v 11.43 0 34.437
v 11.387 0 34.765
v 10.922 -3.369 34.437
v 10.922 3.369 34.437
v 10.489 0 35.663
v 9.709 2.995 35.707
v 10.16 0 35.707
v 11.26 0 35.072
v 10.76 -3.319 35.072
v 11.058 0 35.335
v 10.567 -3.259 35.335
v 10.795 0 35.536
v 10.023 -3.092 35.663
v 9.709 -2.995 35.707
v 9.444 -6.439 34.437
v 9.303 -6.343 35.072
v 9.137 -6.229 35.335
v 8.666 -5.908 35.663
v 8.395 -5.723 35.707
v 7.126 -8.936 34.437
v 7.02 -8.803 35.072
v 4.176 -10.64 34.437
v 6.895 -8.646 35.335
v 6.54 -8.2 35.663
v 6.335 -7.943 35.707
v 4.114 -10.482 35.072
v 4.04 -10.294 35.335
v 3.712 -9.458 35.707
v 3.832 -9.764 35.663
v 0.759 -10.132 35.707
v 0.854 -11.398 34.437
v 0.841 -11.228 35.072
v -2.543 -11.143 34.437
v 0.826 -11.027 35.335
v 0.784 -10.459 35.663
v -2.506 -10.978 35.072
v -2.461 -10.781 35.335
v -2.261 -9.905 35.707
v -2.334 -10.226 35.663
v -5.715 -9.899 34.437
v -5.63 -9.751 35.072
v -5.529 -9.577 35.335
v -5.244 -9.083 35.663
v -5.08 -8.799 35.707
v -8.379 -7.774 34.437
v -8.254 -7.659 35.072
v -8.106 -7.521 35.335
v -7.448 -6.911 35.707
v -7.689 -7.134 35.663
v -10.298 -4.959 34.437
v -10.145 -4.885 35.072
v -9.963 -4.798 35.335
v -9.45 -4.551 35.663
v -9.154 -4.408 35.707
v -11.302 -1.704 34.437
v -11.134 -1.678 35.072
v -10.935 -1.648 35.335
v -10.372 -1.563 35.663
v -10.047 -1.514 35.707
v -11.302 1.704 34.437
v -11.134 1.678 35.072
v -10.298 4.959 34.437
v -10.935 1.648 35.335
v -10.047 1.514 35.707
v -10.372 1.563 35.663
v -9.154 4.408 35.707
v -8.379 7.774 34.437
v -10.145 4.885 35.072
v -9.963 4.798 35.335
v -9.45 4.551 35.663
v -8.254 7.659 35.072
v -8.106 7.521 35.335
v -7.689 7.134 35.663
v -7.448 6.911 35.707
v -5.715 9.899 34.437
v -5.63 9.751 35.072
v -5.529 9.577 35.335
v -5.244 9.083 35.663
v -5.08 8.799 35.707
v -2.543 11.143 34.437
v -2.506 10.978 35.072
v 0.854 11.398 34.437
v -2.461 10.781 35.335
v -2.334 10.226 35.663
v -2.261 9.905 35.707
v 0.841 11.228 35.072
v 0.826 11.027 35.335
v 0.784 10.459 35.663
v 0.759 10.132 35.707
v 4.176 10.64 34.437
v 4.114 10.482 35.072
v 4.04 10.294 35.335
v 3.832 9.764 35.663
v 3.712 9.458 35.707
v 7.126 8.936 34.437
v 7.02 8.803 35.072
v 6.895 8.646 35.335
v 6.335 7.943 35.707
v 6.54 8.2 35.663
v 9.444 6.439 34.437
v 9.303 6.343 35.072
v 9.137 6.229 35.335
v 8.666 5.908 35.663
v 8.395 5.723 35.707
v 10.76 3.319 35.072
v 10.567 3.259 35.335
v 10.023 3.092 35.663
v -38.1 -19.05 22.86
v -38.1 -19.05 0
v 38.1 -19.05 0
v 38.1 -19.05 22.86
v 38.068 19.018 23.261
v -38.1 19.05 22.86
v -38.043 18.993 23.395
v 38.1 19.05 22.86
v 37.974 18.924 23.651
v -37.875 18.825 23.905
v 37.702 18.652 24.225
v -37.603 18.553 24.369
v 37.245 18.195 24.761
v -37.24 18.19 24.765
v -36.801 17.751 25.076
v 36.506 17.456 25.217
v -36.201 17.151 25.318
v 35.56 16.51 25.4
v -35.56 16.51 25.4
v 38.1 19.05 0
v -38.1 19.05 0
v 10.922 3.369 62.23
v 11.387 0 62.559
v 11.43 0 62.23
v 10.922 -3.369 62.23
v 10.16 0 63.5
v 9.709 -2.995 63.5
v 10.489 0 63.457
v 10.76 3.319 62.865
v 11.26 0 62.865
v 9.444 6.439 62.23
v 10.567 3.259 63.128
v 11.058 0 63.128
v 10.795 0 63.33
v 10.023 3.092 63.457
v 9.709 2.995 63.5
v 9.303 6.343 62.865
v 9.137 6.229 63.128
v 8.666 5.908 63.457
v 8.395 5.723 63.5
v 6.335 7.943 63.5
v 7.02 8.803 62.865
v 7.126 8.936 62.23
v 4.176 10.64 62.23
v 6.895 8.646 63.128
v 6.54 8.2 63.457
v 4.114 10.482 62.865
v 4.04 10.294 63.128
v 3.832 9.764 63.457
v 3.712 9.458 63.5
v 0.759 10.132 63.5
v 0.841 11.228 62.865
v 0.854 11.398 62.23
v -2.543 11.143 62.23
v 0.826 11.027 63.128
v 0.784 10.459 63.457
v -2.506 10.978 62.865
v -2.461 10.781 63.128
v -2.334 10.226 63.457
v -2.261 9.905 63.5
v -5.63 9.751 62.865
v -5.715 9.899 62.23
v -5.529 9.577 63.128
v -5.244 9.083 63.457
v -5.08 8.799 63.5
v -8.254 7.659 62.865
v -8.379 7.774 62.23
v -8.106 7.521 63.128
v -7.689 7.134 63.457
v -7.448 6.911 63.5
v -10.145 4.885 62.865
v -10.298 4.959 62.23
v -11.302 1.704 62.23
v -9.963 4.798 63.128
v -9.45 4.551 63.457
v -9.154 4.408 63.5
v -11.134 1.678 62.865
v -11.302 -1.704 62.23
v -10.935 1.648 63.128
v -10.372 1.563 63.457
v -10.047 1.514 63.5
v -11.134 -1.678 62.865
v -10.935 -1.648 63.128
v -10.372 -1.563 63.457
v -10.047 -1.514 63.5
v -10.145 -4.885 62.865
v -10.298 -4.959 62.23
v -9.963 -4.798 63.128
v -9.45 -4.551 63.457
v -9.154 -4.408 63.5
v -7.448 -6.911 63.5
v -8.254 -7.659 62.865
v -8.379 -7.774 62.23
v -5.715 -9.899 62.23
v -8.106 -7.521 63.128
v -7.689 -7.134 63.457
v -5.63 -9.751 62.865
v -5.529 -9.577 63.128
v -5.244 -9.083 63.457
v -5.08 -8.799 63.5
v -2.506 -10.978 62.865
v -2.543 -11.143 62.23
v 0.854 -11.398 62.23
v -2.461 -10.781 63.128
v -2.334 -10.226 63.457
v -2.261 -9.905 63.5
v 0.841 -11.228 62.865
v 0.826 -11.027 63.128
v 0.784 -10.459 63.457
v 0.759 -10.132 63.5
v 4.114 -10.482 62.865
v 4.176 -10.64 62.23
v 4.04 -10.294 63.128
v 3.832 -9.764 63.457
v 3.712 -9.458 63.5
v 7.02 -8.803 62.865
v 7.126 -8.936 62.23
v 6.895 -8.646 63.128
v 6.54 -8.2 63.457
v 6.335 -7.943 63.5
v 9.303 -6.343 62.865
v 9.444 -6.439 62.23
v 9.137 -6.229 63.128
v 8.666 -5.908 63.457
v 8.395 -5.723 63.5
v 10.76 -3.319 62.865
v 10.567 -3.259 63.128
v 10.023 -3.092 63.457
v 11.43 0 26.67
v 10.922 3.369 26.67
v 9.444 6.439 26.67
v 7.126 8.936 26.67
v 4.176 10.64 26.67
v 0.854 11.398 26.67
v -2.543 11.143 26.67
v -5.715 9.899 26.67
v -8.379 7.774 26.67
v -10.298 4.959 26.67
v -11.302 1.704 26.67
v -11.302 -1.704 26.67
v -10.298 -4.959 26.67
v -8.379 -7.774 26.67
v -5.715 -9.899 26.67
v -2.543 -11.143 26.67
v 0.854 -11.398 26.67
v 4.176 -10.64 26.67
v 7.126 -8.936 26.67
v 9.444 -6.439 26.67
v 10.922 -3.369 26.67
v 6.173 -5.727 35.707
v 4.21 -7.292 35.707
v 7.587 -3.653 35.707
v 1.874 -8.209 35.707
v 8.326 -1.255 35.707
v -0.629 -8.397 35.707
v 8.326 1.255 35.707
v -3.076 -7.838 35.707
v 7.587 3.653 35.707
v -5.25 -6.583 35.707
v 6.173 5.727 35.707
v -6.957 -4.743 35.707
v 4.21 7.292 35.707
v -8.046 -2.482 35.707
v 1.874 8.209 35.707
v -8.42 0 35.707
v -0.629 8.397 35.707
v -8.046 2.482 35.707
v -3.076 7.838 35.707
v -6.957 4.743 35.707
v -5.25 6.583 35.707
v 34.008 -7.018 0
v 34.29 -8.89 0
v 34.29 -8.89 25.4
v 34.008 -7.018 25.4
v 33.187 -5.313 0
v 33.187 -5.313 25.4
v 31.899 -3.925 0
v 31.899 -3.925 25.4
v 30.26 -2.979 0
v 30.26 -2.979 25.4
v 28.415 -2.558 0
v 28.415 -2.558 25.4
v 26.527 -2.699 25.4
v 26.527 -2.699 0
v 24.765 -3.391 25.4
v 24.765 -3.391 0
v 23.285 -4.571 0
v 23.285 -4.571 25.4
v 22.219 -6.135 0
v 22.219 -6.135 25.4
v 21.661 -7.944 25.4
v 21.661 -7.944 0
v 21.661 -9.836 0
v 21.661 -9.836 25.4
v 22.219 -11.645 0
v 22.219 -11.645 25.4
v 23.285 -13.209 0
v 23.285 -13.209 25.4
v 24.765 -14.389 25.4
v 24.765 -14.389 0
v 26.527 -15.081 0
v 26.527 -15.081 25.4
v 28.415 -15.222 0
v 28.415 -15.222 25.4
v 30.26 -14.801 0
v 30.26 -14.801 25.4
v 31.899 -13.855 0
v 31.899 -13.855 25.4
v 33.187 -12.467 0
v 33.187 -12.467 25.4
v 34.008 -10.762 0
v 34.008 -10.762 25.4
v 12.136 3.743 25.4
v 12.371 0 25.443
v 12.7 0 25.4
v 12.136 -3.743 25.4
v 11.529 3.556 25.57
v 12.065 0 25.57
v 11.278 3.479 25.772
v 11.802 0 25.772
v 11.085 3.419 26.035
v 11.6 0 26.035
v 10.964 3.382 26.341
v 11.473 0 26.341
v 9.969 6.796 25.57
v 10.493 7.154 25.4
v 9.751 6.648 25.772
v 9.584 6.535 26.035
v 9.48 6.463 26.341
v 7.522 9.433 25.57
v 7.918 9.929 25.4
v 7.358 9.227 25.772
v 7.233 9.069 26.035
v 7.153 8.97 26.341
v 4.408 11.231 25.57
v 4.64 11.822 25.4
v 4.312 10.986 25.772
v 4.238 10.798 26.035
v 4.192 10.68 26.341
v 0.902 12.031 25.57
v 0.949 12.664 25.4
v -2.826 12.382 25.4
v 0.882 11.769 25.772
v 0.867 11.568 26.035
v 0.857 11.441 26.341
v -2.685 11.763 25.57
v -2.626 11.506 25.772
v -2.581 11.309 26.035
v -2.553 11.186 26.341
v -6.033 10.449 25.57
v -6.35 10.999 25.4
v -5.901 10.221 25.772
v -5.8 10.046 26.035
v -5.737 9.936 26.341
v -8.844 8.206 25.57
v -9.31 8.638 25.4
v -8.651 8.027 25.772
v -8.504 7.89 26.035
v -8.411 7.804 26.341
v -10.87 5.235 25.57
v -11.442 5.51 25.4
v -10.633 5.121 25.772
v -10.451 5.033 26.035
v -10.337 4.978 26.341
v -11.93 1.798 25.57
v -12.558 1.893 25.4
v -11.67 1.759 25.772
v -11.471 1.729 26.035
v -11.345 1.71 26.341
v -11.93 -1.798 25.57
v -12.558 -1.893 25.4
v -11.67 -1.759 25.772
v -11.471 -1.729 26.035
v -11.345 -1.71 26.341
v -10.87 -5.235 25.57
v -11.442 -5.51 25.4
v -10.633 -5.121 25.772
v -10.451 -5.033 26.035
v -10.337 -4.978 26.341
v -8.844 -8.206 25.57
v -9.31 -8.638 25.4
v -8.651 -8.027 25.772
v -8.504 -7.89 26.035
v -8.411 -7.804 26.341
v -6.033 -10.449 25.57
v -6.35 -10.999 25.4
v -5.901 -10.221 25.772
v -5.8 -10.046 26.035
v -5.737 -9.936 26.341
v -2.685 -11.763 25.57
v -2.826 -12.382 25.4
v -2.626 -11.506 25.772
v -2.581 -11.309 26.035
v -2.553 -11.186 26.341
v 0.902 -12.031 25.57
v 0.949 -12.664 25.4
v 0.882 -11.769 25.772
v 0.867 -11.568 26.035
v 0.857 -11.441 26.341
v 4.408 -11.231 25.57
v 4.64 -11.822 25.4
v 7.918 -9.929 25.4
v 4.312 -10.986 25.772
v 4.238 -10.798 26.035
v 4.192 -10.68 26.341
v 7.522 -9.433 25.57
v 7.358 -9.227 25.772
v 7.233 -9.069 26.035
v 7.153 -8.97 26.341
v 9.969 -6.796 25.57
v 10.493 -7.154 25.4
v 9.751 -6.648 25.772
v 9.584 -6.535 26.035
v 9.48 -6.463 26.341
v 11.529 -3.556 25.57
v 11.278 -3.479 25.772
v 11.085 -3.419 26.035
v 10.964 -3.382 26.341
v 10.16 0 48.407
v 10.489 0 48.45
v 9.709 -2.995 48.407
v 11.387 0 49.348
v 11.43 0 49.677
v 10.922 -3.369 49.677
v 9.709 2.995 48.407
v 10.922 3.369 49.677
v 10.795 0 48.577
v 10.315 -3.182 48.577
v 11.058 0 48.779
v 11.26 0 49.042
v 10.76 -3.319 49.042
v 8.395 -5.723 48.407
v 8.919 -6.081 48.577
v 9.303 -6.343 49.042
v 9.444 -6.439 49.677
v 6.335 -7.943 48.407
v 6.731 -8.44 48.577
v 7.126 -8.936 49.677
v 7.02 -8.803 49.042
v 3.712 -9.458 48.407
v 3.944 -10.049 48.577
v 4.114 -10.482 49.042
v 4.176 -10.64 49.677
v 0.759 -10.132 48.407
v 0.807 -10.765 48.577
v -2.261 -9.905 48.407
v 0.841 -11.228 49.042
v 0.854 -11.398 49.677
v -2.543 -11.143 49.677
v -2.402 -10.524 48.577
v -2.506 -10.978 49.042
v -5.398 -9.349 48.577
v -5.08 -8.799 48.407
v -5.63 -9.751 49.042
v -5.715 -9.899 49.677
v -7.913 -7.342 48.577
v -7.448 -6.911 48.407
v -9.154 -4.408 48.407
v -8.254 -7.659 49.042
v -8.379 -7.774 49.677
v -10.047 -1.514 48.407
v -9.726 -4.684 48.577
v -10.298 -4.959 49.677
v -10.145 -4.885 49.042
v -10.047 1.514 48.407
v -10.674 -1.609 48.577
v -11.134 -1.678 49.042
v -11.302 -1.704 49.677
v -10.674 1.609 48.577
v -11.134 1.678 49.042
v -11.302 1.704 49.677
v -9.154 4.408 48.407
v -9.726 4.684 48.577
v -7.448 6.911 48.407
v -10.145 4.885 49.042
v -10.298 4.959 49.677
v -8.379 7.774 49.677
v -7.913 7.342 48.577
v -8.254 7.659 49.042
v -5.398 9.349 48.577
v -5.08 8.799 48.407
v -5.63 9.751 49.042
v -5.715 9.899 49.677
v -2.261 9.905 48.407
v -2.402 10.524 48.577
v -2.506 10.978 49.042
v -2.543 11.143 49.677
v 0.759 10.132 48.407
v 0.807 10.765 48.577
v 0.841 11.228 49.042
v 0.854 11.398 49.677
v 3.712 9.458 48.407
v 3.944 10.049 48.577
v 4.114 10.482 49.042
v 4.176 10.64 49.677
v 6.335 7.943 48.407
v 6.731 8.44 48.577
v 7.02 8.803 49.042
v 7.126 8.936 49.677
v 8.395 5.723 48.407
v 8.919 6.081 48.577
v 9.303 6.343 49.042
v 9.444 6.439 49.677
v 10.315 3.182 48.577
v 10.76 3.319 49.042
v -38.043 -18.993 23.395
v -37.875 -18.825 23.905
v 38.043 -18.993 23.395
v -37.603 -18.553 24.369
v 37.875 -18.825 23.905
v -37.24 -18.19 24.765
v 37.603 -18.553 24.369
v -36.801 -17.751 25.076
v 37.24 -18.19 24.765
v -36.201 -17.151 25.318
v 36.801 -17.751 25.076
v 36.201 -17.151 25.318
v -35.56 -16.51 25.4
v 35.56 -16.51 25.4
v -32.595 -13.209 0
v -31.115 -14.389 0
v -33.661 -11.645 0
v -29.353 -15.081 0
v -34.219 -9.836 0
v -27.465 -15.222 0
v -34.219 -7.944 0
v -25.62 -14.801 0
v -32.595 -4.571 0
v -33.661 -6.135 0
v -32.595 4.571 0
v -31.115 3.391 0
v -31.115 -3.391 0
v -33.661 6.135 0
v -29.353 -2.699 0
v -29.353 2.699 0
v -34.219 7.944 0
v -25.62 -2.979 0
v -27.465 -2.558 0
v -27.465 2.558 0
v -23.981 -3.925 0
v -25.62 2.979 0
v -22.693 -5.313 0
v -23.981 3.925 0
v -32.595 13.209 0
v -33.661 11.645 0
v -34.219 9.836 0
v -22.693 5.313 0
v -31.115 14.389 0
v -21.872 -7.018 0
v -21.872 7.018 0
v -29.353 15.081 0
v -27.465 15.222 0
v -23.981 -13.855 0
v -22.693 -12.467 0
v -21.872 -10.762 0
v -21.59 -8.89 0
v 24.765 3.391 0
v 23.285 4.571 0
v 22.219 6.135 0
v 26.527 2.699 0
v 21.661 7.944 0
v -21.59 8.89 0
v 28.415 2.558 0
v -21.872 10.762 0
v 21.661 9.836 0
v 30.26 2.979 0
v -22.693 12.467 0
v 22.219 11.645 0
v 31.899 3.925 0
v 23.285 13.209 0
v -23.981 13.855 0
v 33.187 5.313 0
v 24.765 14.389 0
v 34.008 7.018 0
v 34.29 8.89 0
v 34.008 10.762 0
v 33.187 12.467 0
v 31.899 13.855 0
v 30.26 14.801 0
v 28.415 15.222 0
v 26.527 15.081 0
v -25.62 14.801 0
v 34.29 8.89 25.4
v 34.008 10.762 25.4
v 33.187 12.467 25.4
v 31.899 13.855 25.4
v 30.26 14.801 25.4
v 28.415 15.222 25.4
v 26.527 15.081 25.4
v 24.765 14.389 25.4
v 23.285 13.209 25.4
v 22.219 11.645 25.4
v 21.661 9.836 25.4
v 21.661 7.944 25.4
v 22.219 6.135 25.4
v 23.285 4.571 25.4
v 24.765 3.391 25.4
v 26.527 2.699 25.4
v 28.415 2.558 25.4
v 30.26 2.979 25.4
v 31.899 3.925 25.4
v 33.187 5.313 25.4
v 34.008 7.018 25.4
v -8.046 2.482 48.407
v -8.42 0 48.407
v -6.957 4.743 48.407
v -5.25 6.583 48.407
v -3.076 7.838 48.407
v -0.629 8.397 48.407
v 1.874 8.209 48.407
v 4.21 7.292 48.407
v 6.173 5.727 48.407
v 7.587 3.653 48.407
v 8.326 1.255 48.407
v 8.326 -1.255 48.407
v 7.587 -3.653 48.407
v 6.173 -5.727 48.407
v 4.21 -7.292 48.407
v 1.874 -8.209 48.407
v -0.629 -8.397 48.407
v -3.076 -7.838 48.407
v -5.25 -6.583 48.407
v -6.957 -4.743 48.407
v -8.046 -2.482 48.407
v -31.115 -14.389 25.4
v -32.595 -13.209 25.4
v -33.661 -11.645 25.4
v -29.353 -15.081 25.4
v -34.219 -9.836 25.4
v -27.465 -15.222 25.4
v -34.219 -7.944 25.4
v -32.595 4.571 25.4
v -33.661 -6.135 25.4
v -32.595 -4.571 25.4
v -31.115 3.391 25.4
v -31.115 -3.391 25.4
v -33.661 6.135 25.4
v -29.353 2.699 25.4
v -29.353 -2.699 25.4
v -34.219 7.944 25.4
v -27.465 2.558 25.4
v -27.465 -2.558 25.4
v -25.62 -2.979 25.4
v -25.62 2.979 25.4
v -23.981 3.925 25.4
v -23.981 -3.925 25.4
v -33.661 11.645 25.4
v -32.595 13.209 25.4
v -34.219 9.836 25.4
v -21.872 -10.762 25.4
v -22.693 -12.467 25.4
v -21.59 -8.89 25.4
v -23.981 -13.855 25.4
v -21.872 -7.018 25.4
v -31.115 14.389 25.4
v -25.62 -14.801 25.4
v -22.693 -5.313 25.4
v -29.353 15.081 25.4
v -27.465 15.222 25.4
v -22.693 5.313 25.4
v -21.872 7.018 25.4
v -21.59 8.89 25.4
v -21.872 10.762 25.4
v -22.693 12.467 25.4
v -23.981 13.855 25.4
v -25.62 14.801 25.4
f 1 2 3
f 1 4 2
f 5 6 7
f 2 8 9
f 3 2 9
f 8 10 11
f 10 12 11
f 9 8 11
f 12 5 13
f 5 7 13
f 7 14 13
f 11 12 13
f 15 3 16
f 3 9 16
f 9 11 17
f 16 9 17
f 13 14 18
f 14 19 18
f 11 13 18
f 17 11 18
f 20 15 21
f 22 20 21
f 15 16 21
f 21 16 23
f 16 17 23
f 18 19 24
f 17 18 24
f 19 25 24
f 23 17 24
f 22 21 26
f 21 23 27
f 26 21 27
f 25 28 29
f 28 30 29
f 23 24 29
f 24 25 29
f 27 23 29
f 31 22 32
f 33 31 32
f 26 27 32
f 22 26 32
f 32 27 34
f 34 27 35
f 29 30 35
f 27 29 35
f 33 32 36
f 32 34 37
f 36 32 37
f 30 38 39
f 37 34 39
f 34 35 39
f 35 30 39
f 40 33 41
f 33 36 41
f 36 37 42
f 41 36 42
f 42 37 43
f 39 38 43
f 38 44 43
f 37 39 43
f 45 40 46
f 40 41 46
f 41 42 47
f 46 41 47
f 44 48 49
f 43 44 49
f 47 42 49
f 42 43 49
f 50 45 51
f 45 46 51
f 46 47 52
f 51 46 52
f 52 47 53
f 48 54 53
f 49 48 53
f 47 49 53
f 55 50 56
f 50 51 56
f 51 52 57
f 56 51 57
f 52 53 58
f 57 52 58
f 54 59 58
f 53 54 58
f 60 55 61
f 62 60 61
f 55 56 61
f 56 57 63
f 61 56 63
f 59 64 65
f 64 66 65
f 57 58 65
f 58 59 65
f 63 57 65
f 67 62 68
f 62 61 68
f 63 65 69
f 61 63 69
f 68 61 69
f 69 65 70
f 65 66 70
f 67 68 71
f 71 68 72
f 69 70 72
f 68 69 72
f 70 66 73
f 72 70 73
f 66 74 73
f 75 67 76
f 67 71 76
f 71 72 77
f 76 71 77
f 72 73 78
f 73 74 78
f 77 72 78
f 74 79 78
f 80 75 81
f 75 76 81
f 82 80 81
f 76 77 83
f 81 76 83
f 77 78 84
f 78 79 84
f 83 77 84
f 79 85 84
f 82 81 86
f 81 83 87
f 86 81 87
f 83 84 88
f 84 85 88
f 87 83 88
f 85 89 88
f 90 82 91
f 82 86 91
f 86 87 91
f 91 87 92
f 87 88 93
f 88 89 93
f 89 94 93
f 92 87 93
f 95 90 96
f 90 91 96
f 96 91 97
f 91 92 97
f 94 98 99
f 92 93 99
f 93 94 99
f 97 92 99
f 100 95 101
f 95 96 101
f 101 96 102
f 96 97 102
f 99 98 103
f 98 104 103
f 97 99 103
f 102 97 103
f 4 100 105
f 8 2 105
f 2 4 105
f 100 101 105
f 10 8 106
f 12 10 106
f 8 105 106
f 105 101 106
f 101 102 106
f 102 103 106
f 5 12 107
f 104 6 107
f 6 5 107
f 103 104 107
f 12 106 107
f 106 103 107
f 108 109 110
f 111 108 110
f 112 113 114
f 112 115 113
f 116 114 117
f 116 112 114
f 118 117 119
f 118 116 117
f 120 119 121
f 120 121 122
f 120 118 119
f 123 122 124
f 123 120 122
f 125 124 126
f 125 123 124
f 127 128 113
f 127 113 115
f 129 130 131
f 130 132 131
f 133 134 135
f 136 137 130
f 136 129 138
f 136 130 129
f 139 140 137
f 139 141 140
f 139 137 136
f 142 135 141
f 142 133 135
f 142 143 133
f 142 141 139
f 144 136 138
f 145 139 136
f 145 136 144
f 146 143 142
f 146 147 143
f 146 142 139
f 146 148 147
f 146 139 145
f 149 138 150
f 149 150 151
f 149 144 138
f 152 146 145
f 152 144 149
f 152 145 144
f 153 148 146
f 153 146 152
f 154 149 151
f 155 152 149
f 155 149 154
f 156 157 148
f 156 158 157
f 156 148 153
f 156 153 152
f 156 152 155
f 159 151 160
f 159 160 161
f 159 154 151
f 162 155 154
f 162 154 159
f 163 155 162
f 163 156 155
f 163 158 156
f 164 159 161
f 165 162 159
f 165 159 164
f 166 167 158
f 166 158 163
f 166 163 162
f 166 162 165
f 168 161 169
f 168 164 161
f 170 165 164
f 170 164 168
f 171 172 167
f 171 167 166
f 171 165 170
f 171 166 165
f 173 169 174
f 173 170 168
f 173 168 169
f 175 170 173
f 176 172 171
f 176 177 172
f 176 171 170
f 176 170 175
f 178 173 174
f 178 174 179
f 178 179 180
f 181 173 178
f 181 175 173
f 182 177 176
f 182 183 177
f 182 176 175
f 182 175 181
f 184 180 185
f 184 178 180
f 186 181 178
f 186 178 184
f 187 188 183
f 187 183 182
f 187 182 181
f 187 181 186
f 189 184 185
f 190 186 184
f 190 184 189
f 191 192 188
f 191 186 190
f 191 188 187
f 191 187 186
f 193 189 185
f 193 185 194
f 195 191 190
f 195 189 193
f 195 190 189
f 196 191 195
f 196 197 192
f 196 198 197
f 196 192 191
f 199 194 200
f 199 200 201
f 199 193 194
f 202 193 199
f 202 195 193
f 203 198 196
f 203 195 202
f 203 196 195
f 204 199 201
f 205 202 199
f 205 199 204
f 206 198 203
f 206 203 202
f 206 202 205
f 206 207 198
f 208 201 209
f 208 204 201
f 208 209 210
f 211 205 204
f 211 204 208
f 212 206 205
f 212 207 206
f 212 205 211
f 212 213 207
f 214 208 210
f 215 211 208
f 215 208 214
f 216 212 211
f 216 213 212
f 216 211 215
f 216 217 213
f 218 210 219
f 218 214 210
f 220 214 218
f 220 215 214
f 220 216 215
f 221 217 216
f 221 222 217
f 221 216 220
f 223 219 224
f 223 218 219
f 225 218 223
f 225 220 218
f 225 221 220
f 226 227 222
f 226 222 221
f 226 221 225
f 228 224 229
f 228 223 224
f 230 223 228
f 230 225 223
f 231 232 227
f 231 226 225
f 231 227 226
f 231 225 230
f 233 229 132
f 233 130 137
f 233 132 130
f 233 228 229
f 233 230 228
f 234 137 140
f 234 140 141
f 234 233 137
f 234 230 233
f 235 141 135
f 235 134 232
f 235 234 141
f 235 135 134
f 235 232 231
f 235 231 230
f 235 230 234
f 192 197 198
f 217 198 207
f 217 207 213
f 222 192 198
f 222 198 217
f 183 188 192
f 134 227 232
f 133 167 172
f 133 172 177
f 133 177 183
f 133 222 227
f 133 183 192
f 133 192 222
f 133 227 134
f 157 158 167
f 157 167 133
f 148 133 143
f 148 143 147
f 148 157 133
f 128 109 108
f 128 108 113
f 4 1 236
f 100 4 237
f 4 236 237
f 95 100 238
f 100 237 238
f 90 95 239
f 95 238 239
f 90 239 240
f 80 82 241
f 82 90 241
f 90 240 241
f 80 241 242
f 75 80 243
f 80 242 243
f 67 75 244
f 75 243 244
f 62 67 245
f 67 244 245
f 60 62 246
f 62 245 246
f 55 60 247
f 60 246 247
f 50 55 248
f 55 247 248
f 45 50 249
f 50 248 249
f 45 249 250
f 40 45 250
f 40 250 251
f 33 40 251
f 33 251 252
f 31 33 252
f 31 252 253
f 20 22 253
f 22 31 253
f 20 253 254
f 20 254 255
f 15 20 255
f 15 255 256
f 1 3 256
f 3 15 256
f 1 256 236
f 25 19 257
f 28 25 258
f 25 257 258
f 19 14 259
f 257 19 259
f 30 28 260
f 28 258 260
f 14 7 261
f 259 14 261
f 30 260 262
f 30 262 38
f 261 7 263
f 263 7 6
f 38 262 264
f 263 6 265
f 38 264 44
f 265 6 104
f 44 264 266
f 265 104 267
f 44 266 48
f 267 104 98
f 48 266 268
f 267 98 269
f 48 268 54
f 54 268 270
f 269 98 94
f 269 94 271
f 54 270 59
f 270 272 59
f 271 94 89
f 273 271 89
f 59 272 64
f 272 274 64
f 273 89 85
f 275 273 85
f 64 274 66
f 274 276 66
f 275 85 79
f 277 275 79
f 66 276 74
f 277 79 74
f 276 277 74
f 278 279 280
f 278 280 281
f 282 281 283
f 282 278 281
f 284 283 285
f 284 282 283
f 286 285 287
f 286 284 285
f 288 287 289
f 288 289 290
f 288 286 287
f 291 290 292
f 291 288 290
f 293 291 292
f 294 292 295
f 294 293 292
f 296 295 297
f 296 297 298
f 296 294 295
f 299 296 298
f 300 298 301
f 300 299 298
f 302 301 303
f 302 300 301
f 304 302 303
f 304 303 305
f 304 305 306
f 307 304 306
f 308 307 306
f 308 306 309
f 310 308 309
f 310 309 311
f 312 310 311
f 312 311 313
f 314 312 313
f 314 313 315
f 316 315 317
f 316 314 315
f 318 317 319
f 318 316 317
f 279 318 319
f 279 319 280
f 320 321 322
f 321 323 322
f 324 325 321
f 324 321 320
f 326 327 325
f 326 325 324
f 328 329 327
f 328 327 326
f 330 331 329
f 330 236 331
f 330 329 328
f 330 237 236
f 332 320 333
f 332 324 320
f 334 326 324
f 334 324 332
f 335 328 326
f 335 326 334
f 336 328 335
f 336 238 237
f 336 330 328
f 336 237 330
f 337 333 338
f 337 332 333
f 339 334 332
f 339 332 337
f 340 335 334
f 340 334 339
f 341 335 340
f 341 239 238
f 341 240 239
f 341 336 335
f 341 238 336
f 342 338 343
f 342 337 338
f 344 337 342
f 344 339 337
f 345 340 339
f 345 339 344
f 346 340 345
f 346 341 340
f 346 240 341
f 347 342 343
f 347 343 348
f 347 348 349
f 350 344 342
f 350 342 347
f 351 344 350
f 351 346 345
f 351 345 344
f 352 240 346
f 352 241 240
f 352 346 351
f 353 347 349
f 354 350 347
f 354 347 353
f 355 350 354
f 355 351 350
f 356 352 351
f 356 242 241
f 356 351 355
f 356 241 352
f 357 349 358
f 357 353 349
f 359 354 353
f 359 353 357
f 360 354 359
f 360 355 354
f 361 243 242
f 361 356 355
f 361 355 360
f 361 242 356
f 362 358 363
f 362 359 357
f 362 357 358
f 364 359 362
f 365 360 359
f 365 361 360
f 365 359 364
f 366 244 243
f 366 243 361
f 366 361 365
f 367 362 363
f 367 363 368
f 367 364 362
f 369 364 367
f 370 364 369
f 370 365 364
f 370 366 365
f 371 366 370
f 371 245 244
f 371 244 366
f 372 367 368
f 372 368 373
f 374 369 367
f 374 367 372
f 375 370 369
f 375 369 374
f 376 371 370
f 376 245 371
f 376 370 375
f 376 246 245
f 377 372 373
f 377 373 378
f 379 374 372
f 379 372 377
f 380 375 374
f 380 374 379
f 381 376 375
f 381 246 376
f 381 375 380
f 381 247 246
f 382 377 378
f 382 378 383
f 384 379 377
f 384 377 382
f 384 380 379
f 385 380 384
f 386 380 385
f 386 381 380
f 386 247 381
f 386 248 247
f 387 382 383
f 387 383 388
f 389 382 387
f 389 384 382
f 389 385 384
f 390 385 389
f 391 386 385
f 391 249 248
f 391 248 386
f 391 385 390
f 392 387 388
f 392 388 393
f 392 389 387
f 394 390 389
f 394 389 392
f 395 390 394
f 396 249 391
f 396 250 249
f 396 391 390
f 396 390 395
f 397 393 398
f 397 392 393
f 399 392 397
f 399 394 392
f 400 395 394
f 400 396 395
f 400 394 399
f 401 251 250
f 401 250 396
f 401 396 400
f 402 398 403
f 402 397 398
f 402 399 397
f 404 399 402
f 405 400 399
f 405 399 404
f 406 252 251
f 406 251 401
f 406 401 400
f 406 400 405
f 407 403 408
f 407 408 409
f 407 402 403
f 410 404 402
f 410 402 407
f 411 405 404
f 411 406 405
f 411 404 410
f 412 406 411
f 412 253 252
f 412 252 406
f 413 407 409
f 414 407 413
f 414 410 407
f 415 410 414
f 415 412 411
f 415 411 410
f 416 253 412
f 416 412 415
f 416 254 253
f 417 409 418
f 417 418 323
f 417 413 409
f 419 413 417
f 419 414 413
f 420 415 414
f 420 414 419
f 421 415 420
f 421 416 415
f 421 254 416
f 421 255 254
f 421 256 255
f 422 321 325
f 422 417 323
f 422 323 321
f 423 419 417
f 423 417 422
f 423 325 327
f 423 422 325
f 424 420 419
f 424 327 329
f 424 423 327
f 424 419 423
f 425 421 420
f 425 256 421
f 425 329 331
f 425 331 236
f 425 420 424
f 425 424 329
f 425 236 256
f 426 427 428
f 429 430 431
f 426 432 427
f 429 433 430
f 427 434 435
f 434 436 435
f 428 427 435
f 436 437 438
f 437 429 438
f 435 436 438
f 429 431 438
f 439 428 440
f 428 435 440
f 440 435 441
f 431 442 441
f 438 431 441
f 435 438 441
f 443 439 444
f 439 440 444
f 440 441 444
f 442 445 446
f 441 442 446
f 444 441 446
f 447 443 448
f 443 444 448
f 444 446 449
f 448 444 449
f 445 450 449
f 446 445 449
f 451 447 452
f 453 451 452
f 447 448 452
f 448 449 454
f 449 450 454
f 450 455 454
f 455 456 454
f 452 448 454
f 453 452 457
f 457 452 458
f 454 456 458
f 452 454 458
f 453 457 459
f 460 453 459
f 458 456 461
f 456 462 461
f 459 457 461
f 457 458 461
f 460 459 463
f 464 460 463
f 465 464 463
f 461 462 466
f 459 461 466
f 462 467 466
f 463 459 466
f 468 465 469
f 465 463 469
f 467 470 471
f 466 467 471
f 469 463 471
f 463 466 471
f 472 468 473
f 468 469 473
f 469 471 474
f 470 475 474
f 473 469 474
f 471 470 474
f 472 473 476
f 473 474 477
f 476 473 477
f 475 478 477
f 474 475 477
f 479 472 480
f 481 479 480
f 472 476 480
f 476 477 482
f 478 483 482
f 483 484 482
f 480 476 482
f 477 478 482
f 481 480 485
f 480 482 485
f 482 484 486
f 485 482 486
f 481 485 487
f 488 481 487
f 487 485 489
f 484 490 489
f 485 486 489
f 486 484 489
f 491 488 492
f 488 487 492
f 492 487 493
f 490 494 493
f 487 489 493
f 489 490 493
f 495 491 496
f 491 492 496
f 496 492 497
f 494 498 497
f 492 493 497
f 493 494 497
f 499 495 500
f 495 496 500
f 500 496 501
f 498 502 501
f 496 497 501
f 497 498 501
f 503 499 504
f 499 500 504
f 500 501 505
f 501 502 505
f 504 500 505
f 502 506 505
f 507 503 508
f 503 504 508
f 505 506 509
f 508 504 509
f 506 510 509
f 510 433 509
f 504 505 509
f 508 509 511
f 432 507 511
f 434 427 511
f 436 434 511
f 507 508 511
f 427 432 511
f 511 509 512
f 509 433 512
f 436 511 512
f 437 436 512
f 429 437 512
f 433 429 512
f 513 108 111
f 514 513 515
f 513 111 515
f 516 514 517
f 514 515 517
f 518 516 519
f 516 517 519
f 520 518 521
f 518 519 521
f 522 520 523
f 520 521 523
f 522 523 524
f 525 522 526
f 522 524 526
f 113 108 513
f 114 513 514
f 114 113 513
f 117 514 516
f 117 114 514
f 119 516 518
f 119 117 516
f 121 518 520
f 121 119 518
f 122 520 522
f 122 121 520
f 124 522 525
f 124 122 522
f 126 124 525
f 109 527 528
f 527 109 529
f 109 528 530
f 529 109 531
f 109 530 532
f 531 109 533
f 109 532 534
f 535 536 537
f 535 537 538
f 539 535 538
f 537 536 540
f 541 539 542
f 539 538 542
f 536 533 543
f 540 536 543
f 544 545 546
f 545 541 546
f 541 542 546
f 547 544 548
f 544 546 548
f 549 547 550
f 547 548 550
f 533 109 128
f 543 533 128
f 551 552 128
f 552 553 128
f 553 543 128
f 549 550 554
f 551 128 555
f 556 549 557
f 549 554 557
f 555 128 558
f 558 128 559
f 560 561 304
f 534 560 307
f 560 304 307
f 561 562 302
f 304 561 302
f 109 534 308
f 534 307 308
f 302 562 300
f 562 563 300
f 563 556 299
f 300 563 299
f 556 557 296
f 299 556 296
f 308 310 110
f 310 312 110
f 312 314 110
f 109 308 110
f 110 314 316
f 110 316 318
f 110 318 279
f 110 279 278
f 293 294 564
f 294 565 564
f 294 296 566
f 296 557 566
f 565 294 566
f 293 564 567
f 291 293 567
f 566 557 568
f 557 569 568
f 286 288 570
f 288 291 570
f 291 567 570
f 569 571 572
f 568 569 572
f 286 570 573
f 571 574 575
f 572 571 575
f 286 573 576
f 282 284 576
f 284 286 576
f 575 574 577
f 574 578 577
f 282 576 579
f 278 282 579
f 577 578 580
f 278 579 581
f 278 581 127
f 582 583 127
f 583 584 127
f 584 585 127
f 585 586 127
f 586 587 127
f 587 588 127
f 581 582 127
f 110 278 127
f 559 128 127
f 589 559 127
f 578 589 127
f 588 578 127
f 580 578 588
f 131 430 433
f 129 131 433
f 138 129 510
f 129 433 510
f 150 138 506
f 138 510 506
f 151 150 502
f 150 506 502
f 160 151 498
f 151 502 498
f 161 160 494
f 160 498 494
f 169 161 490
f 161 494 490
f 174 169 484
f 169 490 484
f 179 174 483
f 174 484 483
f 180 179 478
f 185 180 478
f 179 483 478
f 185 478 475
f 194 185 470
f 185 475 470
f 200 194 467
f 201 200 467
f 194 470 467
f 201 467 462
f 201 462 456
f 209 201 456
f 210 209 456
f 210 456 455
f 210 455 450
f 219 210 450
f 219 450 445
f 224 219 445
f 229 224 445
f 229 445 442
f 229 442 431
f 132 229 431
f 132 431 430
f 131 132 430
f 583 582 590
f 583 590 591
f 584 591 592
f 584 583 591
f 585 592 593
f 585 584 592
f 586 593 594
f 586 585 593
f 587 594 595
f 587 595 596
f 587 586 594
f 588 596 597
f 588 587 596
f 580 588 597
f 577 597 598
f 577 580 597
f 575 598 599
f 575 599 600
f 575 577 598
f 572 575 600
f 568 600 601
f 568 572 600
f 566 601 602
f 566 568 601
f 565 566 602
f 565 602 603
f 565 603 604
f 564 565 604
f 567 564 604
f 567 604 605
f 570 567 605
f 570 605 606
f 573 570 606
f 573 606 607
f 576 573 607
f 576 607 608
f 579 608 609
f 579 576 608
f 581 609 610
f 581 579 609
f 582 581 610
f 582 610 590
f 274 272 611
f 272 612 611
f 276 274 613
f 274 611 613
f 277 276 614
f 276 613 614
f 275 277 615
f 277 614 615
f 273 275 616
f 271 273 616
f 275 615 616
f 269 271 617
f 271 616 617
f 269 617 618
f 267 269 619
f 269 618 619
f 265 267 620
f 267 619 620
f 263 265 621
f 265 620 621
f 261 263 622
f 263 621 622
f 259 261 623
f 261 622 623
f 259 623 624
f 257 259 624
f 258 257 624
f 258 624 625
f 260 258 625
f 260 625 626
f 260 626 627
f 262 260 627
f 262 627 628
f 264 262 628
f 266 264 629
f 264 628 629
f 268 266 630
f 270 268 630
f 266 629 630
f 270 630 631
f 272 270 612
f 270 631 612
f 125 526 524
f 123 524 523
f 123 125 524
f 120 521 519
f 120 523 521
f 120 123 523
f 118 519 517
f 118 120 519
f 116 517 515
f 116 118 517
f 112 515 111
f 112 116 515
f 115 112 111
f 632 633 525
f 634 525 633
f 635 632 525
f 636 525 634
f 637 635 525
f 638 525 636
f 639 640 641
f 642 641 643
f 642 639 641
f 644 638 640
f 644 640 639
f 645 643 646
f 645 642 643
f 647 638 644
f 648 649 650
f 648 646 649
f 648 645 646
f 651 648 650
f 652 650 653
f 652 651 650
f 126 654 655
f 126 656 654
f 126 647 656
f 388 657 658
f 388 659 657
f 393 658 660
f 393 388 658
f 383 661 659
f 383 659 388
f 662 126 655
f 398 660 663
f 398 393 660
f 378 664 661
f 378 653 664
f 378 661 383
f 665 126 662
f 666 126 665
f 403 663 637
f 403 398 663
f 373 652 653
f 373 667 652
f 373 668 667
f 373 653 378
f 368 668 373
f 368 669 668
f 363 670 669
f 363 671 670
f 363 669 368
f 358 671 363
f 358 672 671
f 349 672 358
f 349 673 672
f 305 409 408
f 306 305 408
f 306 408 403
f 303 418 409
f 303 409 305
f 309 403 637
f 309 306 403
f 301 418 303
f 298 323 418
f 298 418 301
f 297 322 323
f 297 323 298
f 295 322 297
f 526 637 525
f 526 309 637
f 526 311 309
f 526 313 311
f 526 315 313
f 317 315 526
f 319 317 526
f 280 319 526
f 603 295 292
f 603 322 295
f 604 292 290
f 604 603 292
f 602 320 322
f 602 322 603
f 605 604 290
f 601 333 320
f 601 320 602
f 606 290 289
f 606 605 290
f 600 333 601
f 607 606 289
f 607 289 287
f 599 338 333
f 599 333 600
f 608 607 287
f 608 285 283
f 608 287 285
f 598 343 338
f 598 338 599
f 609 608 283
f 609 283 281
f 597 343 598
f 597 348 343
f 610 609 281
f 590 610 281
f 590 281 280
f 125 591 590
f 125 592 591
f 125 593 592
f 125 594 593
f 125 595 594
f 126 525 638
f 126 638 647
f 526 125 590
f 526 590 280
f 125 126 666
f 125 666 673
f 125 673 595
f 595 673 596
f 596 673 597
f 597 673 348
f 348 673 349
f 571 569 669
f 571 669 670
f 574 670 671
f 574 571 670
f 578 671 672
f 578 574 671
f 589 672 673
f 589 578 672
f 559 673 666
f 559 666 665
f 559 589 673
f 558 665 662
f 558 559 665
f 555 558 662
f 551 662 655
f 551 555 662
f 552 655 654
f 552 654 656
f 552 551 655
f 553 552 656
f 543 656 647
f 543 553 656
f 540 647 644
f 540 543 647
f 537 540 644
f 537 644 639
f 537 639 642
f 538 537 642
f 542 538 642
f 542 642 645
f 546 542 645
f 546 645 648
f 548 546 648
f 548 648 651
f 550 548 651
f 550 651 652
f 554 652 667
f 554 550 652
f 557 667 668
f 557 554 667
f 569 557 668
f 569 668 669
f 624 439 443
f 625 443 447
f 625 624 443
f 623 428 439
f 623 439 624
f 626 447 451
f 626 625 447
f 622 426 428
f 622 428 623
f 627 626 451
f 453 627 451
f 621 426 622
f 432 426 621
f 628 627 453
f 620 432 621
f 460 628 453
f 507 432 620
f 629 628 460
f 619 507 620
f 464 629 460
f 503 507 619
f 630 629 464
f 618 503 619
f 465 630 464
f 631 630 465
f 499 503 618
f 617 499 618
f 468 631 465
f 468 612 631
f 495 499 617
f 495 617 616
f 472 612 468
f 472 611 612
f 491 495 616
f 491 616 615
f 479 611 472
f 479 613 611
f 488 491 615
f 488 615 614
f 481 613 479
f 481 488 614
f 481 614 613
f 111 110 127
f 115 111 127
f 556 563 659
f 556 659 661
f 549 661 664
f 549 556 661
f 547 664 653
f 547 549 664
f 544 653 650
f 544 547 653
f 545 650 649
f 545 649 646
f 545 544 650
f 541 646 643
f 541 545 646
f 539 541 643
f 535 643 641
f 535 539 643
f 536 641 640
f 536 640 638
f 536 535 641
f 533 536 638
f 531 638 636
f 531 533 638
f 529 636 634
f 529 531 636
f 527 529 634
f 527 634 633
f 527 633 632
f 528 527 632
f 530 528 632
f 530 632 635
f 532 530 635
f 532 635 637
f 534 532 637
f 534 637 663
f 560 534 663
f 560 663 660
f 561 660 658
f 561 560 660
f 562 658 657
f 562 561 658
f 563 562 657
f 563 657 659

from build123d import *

# Parameters (mm, degrees)
F0_W     = 76.2
F0_H     = 38.1
F1_DEPTH = 25.4
F2_R     = 6.35
F3_DEPTH = 25.4
F4_R     = 11.43
F5_DEPTH = 38.1
F6_W     = 15.24
F6_H     = 12.7
F8_R     = 2.54
F9_R     = 1.27


with BuildPart() as f1:
    # F0 (on Top) → F1 (new body)
    with BuildSketch(Plane.XY):
        Rectangle(F0_W, F0_H)
    extrude(amount=F1_DEPTH)

    # F2 (on Top) → F3 (cut)
    with BuildSketch(Plane.XY):
        with Locations((-27.94, 8.89)):
            Circle(F2_R)
        with Locations((27.94, 8.89)):
            Circle(F2_R)
        with Locations((-27.94, -8.89)):
            Circle(F2_R)
        with Locations((27.94, -8.89)):
            Circle(F2_R)
    extrude(amount=F3_DEPTH, mode=Mode.SUBTRACT)

    # F4 (on face) → F5 (join)
    with BuildSketch(Plane.XY.offset(25.4)):
        Circle(F4_R)
    extrude(amount=F5_DEPTH)

    # F6 (on Front) → F7 (revolve, cut)
    with BuildSketch(Plane.XZ):
        with Locations((-16.0404087242, 42.0565381646)):
            Rectangle(F6_W, F6_H)
    revolve(axis=Axis((0, 0, 25.4), (0, 0, -1)), mode=Mode.SUBTRACT)

    # F8
    f8_edges = [f1.edges().sort_by_distance(p)[0] for p in [
        (-38.1, 0, 25.4),
        (0, -19.05, 25.4),
        (38.1, 0, 25.4),
        (0, 19.05, 25.4),
    ]]
    fillet(f8_edges, radius=F8_R)

    # F9
    f9_edges = [f1.edges().sort_by_distance(p)[0] for p in [
        (-11.43, 0, 63.5),
        (-11.43, 0, 35.706538),
        (-11.43, 0, 48.406538),
        (-11.43, 0, 25.4),
    ]]
    fillet(f9_edges, radius=F9_R)


solid = f1.part
